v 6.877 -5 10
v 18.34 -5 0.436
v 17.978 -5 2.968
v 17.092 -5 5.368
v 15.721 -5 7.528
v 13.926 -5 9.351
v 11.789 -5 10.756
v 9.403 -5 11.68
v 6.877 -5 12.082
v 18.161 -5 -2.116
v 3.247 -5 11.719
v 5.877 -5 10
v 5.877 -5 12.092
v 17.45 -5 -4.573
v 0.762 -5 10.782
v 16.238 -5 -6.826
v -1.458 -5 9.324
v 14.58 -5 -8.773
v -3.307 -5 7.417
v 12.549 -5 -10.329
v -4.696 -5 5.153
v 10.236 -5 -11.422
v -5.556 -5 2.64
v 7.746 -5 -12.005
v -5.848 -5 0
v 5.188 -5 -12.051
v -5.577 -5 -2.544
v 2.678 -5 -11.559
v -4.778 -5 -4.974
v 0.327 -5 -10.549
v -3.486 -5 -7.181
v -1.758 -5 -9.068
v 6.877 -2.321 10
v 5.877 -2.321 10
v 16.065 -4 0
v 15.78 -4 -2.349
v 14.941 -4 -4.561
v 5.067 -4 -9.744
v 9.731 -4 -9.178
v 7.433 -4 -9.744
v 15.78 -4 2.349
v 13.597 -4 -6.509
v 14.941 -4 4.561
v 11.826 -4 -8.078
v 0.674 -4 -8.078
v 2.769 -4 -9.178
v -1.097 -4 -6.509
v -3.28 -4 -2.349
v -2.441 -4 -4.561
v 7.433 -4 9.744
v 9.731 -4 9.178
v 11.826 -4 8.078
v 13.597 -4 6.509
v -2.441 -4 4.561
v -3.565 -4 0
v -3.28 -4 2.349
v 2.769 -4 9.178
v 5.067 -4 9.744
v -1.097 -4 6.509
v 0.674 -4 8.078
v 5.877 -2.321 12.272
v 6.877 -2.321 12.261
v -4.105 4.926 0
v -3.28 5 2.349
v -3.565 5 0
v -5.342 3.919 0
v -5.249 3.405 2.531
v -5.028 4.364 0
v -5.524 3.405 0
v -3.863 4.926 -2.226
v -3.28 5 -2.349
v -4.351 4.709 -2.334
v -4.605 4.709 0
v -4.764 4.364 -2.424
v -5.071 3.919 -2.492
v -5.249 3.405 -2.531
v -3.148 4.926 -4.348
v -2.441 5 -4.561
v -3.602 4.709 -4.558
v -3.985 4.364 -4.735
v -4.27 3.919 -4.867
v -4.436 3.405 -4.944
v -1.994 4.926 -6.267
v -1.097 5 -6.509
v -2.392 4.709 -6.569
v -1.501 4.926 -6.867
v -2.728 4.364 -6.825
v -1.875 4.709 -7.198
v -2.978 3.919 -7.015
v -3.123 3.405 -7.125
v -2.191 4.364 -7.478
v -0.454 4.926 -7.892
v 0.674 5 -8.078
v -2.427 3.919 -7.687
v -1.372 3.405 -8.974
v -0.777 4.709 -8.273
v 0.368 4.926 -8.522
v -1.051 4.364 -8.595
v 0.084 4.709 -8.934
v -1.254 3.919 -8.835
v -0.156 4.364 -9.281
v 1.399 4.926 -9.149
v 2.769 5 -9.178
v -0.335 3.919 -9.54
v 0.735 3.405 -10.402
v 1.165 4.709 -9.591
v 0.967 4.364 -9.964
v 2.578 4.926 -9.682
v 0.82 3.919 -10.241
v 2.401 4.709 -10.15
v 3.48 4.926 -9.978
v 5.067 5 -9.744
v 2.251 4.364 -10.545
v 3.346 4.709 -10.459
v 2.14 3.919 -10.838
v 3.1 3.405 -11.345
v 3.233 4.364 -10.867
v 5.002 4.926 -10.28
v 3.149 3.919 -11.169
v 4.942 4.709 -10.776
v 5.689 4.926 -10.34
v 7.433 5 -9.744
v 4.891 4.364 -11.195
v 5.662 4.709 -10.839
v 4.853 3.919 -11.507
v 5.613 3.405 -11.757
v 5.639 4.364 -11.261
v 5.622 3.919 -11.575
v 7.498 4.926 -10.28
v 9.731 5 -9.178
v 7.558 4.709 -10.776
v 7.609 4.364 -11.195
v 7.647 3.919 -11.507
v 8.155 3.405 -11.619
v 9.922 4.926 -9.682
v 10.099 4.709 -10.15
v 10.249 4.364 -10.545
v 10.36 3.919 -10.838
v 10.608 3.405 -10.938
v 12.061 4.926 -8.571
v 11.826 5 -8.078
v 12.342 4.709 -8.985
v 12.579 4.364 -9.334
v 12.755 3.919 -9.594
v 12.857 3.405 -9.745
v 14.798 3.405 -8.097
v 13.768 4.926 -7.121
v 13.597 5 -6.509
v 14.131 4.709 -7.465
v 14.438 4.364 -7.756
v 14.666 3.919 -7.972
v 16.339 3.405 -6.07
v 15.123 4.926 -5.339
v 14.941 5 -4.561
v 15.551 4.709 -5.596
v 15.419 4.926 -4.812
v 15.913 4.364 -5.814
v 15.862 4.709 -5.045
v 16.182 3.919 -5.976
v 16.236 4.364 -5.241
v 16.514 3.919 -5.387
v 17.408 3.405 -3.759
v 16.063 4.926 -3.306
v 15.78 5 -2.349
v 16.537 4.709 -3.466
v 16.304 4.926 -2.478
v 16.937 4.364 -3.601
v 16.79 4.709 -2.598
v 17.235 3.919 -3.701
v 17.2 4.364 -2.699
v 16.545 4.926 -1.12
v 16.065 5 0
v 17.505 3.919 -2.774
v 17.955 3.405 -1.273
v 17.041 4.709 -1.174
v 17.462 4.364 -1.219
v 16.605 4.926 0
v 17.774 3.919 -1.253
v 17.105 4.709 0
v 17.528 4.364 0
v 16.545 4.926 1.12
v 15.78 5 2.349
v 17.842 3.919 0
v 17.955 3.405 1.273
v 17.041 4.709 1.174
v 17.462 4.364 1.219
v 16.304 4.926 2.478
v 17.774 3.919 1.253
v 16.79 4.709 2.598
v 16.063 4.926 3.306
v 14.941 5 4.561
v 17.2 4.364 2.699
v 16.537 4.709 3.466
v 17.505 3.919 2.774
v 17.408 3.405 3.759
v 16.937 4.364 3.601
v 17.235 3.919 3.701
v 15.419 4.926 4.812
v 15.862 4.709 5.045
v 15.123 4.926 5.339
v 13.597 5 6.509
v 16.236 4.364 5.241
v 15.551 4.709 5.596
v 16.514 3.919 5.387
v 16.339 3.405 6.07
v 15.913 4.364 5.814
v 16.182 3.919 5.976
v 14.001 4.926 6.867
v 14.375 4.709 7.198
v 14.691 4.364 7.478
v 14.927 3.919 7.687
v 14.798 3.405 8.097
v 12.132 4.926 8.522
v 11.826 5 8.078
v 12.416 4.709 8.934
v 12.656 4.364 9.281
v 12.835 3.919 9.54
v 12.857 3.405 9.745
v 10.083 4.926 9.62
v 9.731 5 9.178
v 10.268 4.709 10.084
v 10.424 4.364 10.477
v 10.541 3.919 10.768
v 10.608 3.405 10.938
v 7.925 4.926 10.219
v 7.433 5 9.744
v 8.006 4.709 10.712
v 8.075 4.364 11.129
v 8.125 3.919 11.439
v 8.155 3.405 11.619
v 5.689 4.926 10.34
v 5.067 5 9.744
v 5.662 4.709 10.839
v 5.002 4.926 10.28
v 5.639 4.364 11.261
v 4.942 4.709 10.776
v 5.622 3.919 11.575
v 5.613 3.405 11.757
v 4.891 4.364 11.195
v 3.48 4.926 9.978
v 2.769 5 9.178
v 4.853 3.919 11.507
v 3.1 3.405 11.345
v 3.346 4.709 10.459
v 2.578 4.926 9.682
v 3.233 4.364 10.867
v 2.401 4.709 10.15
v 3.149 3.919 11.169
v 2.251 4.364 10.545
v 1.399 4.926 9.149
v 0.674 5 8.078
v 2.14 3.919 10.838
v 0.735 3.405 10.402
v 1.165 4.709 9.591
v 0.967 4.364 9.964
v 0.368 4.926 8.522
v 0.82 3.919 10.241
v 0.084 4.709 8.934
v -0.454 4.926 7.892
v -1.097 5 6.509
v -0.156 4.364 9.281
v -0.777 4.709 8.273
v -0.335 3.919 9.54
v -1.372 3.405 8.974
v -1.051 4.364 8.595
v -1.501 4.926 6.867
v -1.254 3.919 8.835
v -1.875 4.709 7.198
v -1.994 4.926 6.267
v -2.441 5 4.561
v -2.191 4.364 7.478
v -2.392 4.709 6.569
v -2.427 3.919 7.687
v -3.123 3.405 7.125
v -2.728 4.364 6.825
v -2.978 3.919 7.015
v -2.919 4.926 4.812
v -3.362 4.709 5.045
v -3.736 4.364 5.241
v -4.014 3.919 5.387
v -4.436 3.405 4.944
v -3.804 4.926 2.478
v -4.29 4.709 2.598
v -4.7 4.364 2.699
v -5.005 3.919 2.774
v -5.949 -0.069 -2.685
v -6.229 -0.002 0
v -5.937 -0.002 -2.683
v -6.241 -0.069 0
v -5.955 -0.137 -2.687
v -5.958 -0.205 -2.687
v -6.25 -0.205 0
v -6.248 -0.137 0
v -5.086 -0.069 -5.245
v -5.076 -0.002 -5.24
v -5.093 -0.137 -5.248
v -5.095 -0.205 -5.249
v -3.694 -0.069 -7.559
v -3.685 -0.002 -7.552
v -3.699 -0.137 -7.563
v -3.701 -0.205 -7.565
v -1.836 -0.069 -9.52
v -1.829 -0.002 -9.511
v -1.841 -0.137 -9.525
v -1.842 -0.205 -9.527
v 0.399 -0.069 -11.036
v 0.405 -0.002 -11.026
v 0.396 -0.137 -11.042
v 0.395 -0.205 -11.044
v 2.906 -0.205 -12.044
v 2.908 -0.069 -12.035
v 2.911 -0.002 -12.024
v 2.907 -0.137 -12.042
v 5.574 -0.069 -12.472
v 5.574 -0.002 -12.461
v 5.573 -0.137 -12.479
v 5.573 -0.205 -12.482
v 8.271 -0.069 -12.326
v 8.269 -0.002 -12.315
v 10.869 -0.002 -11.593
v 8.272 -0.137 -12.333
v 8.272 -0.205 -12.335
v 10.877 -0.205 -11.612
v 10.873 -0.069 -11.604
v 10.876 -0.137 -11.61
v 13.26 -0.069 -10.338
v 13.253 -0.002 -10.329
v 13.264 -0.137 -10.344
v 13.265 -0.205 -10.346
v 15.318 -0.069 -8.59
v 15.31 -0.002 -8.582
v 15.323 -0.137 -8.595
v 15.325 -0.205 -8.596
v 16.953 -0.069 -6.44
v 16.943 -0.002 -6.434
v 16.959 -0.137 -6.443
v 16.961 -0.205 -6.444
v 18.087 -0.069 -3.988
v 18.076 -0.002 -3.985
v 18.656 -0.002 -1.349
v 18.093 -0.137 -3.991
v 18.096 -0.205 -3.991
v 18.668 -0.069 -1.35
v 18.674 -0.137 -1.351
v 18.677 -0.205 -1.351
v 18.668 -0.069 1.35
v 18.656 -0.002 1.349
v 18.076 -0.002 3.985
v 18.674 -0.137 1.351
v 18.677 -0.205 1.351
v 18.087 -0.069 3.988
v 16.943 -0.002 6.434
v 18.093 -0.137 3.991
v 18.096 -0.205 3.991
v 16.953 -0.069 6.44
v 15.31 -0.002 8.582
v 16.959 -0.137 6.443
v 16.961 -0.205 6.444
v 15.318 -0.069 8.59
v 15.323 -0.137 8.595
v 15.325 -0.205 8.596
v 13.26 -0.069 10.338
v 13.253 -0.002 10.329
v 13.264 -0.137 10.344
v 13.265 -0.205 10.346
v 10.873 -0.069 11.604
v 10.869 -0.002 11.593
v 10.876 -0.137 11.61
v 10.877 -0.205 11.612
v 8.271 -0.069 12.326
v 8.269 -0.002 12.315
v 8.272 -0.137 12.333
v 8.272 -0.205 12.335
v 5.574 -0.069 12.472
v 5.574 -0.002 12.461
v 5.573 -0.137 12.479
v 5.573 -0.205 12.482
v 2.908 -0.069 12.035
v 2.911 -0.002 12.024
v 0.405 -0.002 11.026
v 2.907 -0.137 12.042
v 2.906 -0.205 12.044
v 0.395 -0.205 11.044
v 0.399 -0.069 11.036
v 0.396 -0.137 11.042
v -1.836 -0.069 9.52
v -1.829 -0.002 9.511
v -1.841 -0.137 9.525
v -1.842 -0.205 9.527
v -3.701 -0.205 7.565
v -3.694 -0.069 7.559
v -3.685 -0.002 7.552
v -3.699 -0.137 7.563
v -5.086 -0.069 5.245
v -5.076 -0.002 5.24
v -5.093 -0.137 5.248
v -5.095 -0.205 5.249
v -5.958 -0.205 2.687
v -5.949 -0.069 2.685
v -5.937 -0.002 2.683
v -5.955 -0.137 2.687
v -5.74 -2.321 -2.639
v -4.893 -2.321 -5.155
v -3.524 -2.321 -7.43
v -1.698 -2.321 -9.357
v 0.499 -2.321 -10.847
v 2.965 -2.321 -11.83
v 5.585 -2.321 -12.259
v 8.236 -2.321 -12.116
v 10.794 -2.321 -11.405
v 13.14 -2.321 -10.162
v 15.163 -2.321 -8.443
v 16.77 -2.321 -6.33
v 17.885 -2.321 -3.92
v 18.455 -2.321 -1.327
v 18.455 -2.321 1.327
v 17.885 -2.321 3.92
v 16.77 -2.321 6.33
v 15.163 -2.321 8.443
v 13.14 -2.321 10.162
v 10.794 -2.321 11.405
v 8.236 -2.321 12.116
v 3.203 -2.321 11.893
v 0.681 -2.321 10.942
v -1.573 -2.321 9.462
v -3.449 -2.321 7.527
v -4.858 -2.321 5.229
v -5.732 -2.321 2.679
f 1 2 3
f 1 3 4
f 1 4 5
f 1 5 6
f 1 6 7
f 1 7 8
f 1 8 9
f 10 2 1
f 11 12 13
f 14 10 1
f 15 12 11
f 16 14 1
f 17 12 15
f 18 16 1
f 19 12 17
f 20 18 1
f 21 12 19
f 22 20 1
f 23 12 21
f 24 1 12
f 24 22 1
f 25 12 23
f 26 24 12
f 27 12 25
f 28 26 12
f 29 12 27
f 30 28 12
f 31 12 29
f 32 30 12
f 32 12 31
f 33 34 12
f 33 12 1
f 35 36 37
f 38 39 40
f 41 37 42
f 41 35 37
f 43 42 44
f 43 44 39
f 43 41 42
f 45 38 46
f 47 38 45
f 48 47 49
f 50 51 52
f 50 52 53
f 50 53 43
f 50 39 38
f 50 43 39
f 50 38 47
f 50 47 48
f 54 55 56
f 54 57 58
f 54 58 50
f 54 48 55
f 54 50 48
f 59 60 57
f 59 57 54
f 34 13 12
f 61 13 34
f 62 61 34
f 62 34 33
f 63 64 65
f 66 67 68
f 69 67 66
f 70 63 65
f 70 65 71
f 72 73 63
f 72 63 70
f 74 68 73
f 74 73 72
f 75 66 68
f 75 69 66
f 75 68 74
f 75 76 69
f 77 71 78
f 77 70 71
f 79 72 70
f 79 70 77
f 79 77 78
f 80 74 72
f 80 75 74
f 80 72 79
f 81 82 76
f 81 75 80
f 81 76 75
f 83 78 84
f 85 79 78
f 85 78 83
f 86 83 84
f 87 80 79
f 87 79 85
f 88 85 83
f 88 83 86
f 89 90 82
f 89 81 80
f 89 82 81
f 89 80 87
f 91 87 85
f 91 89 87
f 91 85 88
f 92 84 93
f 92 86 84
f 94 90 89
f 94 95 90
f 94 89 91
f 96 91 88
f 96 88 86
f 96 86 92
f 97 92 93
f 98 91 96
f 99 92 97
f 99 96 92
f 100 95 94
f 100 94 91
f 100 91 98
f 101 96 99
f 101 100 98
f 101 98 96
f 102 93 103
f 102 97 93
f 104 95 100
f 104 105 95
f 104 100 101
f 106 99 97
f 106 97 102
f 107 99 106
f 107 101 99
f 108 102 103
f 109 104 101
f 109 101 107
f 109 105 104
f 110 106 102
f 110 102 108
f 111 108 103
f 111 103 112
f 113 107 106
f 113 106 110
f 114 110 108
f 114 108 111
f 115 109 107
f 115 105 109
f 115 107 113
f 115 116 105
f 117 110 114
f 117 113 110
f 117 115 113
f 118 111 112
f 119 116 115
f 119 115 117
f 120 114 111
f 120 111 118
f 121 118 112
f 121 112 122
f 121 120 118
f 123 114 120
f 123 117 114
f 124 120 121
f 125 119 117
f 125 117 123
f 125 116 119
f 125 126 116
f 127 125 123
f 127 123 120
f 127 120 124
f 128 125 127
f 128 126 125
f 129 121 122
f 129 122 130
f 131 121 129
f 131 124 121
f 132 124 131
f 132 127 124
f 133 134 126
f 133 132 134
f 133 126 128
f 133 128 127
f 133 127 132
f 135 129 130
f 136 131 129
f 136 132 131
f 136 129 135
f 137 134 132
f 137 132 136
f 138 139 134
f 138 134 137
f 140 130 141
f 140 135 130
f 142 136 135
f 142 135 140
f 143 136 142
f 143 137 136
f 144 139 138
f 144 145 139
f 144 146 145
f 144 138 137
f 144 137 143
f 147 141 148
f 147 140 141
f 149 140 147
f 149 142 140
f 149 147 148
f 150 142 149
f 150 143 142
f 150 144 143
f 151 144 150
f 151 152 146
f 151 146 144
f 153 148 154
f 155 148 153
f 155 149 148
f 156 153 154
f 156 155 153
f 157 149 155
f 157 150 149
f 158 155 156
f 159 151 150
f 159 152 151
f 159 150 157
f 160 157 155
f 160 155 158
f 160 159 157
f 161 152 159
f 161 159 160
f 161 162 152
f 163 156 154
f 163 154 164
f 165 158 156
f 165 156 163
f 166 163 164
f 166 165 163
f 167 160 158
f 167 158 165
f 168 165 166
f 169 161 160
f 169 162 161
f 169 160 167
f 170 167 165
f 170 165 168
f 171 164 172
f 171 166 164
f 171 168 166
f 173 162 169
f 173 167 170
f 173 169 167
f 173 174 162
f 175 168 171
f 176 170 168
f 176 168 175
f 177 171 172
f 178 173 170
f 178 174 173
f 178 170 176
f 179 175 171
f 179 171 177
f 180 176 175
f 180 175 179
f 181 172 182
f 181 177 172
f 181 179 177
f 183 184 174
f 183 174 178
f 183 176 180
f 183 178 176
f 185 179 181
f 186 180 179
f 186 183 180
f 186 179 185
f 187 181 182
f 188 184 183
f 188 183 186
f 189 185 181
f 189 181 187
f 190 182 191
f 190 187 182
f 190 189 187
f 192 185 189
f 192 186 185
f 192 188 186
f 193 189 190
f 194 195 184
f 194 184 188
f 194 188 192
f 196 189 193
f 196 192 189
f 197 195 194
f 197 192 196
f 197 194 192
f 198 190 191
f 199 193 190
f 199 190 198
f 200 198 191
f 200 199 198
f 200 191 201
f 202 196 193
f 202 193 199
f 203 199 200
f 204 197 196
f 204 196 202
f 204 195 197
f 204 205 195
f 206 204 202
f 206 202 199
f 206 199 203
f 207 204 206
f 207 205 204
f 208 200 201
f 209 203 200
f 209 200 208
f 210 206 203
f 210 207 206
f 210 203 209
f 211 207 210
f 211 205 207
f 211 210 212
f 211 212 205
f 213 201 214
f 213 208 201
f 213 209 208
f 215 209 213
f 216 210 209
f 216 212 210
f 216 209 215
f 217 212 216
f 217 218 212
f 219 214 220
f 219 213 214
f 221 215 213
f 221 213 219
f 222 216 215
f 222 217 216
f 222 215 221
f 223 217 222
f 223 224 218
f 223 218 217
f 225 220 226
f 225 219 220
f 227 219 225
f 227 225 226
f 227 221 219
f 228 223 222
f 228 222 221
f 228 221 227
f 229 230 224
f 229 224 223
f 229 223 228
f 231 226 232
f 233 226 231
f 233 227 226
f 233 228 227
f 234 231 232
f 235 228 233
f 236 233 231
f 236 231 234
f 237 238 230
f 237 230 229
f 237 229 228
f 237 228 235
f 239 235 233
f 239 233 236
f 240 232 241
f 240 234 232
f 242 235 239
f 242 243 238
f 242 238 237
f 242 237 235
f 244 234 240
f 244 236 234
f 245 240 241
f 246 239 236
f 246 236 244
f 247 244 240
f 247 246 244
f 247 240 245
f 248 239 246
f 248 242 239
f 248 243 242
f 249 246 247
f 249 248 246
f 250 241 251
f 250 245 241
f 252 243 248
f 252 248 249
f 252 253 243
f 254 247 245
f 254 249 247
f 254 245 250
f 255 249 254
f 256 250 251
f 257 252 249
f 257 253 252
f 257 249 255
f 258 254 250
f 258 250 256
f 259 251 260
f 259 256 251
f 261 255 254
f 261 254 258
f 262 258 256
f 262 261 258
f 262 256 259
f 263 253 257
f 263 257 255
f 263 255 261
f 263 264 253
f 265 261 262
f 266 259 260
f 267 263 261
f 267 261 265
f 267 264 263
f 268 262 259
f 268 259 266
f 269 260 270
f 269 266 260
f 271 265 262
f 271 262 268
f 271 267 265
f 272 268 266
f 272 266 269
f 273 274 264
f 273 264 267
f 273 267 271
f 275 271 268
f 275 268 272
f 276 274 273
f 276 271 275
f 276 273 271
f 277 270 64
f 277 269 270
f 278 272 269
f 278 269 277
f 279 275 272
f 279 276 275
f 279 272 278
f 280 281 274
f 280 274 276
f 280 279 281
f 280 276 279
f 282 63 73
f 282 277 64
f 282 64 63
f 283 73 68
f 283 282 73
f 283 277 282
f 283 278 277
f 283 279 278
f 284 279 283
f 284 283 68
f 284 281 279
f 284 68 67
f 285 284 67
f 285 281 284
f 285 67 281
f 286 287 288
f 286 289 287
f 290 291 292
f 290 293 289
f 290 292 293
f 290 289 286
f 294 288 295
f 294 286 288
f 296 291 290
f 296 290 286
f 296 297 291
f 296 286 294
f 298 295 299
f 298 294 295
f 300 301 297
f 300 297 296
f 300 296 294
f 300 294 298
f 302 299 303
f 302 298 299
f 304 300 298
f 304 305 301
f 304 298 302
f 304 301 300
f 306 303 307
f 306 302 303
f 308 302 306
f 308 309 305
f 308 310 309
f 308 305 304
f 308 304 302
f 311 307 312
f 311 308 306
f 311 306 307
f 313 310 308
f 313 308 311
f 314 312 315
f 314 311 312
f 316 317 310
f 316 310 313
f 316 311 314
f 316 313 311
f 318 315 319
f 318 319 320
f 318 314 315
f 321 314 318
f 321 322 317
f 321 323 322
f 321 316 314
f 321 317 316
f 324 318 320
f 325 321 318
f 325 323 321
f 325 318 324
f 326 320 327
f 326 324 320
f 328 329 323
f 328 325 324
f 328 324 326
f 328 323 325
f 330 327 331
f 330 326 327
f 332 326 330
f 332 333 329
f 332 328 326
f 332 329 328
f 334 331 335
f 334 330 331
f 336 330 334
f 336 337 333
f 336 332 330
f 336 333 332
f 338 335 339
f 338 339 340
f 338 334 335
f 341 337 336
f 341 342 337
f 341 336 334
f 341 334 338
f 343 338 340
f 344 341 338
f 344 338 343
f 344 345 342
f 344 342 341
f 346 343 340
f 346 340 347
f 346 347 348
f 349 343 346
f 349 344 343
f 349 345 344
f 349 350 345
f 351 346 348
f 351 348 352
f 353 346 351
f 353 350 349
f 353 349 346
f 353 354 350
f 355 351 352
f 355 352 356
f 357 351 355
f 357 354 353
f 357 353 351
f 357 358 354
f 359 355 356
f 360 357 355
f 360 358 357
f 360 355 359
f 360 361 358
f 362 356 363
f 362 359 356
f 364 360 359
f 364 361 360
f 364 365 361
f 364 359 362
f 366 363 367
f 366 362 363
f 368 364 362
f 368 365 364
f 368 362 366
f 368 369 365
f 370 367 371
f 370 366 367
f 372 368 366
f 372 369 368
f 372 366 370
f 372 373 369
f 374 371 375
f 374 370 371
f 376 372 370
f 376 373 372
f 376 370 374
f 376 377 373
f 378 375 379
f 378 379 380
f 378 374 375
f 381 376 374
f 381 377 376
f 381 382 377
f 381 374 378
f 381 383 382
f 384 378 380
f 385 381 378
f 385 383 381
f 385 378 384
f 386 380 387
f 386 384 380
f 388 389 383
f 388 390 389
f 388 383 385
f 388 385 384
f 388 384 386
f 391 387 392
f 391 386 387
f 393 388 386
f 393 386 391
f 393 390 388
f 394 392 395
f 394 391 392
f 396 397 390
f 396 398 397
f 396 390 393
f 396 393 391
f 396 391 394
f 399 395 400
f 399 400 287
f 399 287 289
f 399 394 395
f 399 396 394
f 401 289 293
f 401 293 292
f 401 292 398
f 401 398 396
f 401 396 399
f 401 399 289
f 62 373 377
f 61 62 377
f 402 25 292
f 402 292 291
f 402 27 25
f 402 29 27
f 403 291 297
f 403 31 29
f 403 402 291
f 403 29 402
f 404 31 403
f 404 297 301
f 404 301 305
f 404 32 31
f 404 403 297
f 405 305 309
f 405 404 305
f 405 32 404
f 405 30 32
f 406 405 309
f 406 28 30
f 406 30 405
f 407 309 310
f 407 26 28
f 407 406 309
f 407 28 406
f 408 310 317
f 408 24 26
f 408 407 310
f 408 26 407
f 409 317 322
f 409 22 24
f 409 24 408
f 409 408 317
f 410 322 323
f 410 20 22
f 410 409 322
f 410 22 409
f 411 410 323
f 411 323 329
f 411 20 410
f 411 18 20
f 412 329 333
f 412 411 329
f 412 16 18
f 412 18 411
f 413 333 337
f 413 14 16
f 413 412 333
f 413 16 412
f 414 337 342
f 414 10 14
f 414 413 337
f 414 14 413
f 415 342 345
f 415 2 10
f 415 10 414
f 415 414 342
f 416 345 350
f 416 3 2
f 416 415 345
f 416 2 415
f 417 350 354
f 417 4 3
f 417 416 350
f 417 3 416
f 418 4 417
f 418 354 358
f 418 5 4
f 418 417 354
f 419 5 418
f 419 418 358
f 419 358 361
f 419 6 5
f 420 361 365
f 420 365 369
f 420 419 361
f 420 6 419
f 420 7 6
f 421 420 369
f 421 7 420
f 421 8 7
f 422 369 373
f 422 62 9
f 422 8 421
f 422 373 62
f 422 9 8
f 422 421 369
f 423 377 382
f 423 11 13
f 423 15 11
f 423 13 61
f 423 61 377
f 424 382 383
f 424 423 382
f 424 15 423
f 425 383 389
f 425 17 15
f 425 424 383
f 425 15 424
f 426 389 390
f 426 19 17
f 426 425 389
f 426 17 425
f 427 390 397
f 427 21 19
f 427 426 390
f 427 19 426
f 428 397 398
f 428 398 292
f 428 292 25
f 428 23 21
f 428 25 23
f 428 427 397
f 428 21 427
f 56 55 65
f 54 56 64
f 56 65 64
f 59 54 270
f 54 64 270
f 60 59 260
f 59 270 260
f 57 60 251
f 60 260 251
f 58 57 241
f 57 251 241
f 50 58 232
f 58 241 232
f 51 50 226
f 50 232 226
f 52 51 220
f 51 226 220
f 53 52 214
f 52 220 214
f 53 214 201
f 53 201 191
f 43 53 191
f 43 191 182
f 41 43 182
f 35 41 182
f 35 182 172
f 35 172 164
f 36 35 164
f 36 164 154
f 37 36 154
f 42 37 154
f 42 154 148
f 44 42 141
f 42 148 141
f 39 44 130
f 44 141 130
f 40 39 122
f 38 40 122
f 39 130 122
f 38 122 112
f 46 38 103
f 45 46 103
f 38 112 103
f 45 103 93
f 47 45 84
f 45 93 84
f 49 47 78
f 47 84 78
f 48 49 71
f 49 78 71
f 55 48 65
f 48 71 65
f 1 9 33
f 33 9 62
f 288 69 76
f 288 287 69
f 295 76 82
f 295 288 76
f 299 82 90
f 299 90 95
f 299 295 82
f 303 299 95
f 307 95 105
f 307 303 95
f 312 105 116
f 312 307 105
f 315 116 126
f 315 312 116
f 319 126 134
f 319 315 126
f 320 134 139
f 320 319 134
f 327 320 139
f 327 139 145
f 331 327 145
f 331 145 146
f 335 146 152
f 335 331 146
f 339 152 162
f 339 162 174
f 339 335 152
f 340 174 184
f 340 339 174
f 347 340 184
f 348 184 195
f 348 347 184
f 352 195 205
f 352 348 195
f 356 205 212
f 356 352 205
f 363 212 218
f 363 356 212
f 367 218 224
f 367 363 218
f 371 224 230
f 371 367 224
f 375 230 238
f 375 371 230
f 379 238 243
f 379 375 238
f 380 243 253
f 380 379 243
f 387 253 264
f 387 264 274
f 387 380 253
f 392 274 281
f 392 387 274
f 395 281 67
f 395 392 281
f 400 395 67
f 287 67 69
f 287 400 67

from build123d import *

# Parameters (mm, degrees)
F2_R     = 9.8153968116
F3_DEPTH = 9
F5_W     = 1
F5_H     = 3
F6_DEPTH = 10


with BuildPart() as f1:
    # F0 (on Top) → F1 (revolve)
    with BuildSketch(Plane.XY):
        with BuildLine():
            Line((6.25, 5), (-3.5653968116, 5))
            ThreePointArc((-3.5653968116, 5), (-4.8281685697, 4.5509376154), (-5.523877031, 3.4054074869))
            Line((-5.523877031, 3.4054074869), (-6.2292401097, -0.0021261228))
            ThreePointArc((-6.2292401097, -0.0021261228), (-6.2447964892, -0.1029478503), (-6.25, -0.2048298662))
            add(Edge.make_bspline(
                [(-6.25, -0.2048298662), (-6.0833294246, -1.9201700348), (-5.8458379979, -3.6322490553), (-5.8479388244, -5)],
                knots=[0, 0, 0, 0, 0.5738842157, 0.5738842157, 0.5738842157, 0.5738842157], degree=3))
            Line((-5.8479388244, -5), (6.25, -5))
            Line((6.25, -5), (6.25, 5))
        make_face()
    revolve(axis=Axis((6.25, 0, 0), (0, -1, 0)))

    # F2 (on face) → F3 (cut)
    with BuildSketch(Plane(origin=(0, 5, 0), x_dir=(-1, 0, 0), z_dir=(0, 1, 0))):
        with Locations((-6.25, 0)):
            Circle(F2_R)
    extrude(amount=-F3_DEPTH, mode=Mode.SUBTRACT)

    # F5 (on offset) → F6 (cut)
    with BuildSketch(Plane.XY.offset(20)):
        with Locations((6.3768936433, -3.820542492)):
            Rectangle(F5_W, F5_H)
    extrude(amount=-F6_DEPTH, mode=Mode.SUBTRACT)


solid = f1.part
